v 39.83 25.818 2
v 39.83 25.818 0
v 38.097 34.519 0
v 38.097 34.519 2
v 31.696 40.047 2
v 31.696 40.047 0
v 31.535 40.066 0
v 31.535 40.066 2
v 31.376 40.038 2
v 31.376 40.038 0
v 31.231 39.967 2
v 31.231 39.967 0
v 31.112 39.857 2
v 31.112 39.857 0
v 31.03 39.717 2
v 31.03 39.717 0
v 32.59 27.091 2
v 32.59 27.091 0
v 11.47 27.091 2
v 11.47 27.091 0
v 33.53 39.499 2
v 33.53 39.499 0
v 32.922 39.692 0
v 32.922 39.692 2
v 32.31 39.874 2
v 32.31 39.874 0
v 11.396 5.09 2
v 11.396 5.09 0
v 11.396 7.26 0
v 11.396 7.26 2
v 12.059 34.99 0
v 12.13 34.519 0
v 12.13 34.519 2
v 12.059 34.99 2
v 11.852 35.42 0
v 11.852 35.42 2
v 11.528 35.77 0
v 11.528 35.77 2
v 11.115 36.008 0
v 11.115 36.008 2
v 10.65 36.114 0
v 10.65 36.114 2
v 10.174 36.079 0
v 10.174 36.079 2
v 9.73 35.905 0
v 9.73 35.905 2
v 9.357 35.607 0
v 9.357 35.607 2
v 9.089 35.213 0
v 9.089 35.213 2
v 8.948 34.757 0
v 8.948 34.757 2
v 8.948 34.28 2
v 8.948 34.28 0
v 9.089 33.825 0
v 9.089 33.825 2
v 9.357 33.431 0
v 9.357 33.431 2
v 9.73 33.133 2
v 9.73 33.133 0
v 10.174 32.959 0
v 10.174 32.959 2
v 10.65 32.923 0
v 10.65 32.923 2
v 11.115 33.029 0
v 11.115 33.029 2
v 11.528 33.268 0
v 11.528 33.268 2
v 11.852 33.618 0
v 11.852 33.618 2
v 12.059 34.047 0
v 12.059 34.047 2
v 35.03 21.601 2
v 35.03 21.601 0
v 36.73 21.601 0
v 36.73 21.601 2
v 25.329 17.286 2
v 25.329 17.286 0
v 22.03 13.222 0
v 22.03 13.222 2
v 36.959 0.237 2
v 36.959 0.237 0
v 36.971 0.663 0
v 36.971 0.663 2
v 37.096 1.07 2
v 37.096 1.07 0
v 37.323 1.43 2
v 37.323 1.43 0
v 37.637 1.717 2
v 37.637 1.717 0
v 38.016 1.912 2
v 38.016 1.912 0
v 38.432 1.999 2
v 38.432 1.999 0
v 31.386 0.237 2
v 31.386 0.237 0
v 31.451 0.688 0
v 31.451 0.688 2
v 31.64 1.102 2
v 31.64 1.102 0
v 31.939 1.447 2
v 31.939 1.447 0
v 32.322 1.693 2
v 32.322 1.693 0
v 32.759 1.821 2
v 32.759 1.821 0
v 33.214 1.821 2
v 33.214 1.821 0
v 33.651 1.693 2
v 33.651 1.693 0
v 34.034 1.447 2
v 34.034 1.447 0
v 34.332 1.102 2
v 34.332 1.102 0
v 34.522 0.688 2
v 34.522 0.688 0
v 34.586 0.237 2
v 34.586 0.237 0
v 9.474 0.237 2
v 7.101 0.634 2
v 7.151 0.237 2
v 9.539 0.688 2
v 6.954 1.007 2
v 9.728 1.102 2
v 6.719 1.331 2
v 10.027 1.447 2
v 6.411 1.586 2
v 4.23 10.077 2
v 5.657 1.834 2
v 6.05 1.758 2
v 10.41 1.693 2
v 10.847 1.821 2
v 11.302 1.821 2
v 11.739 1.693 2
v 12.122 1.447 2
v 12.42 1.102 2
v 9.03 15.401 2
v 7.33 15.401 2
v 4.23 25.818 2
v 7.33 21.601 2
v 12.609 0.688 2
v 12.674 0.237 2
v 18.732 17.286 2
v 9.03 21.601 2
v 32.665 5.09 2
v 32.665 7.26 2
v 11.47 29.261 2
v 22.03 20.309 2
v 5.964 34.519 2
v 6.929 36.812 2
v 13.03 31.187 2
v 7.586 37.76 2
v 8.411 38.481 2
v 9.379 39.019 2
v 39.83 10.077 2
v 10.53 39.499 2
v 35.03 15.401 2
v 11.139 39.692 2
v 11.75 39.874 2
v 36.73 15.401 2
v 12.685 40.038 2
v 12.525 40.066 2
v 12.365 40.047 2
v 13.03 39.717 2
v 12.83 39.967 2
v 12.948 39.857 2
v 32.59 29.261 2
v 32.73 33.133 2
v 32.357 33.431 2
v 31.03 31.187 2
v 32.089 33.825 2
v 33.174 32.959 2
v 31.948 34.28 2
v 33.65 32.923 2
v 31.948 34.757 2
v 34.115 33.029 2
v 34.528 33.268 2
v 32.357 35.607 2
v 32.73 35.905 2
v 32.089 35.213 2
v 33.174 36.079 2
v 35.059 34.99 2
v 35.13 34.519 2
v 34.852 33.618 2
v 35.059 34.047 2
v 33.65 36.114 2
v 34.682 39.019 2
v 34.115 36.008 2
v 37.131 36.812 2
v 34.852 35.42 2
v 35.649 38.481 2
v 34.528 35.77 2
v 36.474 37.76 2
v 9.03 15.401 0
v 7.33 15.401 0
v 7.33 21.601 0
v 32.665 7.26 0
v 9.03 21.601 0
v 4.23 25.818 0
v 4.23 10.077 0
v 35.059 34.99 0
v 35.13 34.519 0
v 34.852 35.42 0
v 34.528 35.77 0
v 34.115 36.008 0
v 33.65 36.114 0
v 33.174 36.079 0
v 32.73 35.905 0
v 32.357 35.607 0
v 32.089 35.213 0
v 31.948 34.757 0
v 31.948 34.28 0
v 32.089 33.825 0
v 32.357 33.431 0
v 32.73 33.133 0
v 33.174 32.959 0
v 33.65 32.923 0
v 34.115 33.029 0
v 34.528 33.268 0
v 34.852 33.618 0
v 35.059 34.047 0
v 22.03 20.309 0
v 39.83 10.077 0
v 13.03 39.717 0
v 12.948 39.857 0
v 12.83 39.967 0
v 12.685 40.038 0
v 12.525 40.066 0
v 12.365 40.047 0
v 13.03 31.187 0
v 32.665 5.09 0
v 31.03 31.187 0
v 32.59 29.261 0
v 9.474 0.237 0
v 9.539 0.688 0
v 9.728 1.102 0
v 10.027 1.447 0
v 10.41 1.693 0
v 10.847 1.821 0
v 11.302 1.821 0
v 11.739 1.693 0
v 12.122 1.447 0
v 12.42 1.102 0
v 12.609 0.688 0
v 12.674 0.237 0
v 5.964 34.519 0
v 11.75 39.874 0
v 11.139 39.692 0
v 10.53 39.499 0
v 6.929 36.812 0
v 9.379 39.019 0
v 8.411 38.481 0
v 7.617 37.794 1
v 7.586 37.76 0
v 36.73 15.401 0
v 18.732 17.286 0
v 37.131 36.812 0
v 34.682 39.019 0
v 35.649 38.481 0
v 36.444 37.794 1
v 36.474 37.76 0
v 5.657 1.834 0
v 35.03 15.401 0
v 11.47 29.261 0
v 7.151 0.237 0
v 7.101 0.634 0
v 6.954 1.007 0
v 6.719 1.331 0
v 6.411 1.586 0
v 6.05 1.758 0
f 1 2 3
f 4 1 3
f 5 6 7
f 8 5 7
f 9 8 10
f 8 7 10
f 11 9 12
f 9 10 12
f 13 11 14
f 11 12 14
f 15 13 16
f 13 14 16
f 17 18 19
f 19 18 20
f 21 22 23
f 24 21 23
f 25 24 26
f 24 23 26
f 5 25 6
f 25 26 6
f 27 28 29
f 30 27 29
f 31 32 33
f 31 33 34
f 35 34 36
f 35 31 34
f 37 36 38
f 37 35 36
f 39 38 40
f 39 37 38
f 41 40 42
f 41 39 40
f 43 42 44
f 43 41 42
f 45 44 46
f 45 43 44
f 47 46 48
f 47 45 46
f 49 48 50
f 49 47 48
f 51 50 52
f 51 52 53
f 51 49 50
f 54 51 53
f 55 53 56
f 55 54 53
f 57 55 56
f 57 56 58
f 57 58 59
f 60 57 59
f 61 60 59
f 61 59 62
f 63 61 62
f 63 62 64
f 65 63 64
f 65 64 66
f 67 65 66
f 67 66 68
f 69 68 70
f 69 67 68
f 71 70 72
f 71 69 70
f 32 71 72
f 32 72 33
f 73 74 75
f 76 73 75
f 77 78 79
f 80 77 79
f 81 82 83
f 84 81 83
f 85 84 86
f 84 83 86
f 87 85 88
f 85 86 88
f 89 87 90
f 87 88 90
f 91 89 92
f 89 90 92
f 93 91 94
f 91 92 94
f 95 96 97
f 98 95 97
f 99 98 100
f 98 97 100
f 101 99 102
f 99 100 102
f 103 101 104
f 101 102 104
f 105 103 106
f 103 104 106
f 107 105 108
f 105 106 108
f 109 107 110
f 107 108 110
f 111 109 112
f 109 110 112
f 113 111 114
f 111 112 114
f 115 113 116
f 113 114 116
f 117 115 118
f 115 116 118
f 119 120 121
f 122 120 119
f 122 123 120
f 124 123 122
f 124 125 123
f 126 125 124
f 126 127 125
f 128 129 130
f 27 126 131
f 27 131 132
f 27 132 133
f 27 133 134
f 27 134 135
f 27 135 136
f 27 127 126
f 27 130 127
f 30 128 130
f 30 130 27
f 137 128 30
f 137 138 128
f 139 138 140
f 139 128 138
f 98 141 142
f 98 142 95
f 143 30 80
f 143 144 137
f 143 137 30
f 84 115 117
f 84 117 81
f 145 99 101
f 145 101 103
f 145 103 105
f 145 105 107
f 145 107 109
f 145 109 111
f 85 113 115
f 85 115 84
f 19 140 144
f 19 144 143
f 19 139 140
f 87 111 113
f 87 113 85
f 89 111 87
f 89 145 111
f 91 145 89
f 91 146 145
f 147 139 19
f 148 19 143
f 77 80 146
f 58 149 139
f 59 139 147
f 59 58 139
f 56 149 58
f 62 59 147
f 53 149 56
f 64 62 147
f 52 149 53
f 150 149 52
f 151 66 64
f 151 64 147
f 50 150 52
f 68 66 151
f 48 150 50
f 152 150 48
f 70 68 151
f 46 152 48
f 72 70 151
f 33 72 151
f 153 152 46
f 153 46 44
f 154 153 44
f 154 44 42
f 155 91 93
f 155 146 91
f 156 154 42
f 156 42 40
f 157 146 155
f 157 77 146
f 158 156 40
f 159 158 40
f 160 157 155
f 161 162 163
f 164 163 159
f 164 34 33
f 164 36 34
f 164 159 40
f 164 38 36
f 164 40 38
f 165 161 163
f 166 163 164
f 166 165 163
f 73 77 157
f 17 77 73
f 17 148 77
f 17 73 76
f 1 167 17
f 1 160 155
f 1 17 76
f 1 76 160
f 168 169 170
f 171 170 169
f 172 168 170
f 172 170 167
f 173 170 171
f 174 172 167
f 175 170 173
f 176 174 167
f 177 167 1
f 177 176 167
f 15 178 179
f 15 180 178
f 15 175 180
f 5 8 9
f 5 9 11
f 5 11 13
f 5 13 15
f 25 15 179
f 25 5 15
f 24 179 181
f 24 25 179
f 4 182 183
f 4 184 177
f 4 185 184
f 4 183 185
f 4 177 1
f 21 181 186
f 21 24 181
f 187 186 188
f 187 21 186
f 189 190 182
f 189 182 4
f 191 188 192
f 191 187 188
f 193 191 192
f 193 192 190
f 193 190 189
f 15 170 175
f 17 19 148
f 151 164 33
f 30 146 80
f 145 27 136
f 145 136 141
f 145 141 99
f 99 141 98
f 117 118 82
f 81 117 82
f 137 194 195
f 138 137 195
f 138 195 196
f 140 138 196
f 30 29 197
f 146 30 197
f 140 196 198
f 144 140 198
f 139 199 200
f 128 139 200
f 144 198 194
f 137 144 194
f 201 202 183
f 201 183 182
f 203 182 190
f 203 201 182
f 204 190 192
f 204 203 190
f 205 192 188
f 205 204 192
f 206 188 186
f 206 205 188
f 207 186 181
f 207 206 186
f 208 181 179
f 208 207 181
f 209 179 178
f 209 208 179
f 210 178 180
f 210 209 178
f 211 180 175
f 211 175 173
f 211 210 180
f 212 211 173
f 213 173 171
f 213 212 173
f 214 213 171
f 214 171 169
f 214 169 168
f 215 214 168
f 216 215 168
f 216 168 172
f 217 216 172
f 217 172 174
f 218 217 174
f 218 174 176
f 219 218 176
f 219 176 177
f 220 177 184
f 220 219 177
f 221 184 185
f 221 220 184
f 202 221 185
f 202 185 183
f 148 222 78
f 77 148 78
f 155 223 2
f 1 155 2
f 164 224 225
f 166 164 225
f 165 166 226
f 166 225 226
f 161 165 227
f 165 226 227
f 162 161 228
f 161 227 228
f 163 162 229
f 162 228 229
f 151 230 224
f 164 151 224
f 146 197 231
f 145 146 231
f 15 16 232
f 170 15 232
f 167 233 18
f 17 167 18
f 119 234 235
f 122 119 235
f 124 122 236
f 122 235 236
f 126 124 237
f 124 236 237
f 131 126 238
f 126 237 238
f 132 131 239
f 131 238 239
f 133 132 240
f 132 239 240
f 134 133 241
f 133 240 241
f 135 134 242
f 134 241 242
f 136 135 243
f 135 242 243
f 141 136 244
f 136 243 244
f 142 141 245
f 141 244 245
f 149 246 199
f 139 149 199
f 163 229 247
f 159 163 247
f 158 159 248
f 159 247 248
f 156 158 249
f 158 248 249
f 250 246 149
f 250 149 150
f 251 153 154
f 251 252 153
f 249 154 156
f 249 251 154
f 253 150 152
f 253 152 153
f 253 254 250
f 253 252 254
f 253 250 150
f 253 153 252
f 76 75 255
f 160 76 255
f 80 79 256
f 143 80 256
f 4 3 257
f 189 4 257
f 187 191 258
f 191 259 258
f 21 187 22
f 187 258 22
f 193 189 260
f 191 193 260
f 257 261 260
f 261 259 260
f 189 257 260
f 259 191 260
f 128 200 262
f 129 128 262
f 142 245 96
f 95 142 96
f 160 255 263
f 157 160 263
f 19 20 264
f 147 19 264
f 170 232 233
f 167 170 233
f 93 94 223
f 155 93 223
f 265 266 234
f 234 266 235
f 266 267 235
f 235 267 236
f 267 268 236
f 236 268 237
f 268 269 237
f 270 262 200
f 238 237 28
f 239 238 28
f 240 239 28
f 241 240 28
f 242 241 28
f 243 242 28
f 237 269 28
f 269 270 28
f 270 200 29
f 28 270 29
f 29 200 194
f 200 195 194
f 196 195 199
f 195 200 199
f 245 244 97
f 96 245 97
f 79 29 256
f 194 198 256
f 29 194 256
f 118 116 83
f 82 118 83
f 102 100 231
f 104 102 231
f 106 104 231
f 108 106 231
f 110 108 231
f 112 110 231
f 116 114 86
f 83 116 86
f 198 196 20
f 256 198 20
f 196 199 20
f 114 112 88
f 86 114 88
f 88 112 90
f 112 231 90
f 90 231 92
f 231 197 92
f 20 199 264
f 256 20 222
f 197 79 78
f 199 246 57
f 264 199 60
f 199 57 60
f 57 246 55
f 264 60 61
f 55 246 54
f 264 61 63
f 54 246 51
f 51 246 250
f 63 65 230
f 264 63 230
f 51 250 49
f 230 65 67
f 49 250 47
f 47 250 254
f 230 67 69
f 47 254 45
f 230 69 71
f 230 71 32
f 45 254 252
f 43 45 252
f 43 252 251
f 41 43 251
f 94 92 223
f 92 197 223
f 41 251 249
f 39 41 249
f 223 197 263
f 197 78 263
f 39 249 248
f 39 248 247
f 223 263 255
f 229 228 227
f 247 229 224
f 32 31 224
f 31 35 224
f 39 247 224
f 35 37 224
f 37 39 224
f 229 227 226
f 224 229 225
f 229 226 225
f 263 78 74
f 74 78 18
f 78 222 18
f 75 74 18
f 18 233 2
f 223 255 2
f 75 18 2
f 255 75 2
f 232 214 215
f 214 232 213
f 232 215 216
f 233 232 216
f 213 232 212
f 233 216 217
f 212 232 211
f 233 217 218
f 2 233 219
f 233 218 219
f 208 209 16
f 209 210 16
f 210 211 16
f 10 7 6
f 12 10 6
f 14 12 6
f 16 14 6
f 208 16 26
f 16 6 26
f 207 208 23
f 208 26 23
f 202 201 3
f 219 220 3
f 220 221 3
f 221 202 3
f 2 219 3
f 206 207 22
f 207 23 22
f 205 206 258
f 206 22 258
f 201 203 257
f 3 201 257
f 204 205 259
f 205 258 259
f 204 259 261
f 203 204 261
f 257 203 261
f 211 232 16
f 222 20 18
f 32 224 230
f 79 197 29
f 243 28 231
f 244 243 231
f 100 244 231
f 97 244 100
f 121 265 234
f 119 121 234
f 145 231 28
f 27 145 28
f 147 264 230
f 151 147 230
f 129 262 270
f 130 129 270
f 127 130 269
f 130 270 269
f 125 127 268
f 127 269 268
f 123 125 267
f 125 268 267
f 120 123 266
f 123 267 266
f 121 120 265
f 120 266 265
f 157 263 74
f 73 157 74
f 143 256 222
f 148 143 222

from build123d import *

# Parameters (mm, degrees)
F0_R     = 1.6
F1_DEPTH = 2


# Not quite as in the source:
# - ends of sketch curves that miss each other by under 0.0002 mm in the source are joined


with BuildPart() as f1:
    # F0 (on Top) → F1 (new body)
    with BuildSketch(Plane.XY):
        with BuildLine():
            ThreePointArc((9.4743104318, 0.2374556452), (11.0743104318, 1.8374556452), (12.6743104318, 0.2374556452))
            Line((12.6743104318, 0.2374556452), (22.0509076786, 0.2374556452))
            Line((22.0509076786, 0.2374556452), (31.3863246398, 0.2374556452))
            ThreePointArc((31.3863246398, 0.2374556452), (32.9863104318, 1.8374556452), (34.5863104318, 0.2374556452))
            Line((34.5863104318, 0.2374556452), (36.9589188956, 0.2374556452))
            ThreePointArc((36.9589188956, 0.2374556452), (37.322944486, 1.4299580557), (38.4322782501, 1.9991287063))
            Line((38.4322782501, 1.9991287063), (39.8303104318, 10.0774704438))
            Line((39.8303104318, 10.0774704438), (39.8303104318, 25.8181473703))
            Line((39.8303104318, 25.8181473703), (38.0968938881, 34.5188772837))
            add(Edge.make_bspline(
                [(38.0968938881, 34.5188772837), (37.6683242364, 35.7597207754), (36.7252101224, 38.130874007), (34.7779775897, 39.0193902227), (33.5303104318, 39.4987425759)],
                knots=[0, 0, 0, 0, 0.51039131, 1, 1, 1, 1], degree=3))
            ThreePointArc((33.5303104318, 39.4987425759), (32.6165966127, 39.7845023129), (31.6957953827, 40.0465264824))
            ThreePointArc((31.6957953827, 40.0465264824), (31.3007464304, 40.007865889), (31.0303104318, 39.7173100649))
            Line((31.0303104318, 39.7173100649), (31.0303104318, 34.5188772837))
            Line((31.0303104318, 34.5188772837), (31.0303104318, 31.1867967248))
            Line((31.0303104318, 31.1867967248), (32.5903408229, 29.2609930038))
            Line((32.5903408229, 29.2609930038), (32.5903408229, 27.0907320082))
            Line((32.5903408229, 27.0907320082), (22.0303104318, 27.0907320082))
            Line((22.0303104318, 27.0907320082), (11.4702800406, 27.0907320082))
            Line((11.4702800406, 27.0907320082), (11.4702800406, 29.2609930038))
            Line((11.4702800406, 29.2609930038), (13.0303104318, 31.1867967248))
            Line((13.0303104318, 31.1867967248), (13.0303104318, 34.5188772837))
            Line((13.0303104318, 34.5188772837), (13.0303104318, 39.7173100649))
            ThreePointArc((13.0303104318, 39.7173100649), (12.7598744332, 40.007865889), (12.3648254809, 40.0465264824))
            ThreePointArc((12.3648254809, 40.0465264824), (11.4440242509, 39.7845023129), (10.5303104318, 39.4987425759))
            add(Edge.make_bspline(
                [(5.9637269754, 34.5188772837), (6.3922966272, 35.7597207754), (7.3354107411, 38.130874007), (9.2826432739, 39.0193902227), (10.5303104318, 39.4987425759)],
                knots=[0, 0, 0, 0, 0.51039131, 1, 1, 1, 1], degree=3))
            Line((5.9637269754, 34.5188772837), (4.2303104318, 25.8181473703))
            Line((4.2303104318, 25.8181473703), (4.2303104318, 10.0774704438))
            Line((4.2303104318, 10.0774704438), (5.6569326528, 1.8339249926))
            ThreePointArc((5.6569326528, 1.8339249926), (6.7190254428, 1.3306221238), (7.1506988404, 0.2374556452))
            Line((7.1506988404, 0.2374556452), (9.4743104318, 0.2374556452))
        make_face()
        Polygon((11.5445189413, 7.2601027762), (22.0303104318, 7.2601027762), (32.5161019223, 7.2601027762), (32.6645797236, 7.2601027762), (32.6645797236, 5.0898417806), (32.5161019223, 5.0898417806), (11.5445189413, 5.0898417806), (11.39604114, 5.0898417806), (11.39604114, 7.2601027762), align=None, mode=Mode.SUBTRACT)
        Polygon((18.7320070459, 17.286), (22.0303104318, 20.3086156398), (25.3286138177, 17.286), (22.0303104318, 13.222059235), align=None, mode=Mode.SUBTRACT)
        Polygon((8.1803104318, 15.401), (7.3303104318, 15.401), (7.3303104318, 21.601), (8.1803104318, 21.601), (9.0303104318, 21.601), (9.0303104318, 15.401), align=None, mode=Mode.SUBTRACT)
        with Locations((10.5303104318, 34.5188772837)):
            Circle(F0_R, mode=Mode.SUBTRACT)
        Polygon((35.0303104318, 15.401), (35.0303104318, 21.601), (35.8803104318, 21.601), (36.7303104318, 21.601), (36.7303104318, 15.401), (35.8803104318, 15.401), align=None, mode=Mode.SUBTRACT)
        with Locations((33.5303104318, 34.5188772837)):
            Circle(F0_R, mode=Mode.SUBTRACT)
    extrude(amount=F1_DEPTH)


solid = f1.part
